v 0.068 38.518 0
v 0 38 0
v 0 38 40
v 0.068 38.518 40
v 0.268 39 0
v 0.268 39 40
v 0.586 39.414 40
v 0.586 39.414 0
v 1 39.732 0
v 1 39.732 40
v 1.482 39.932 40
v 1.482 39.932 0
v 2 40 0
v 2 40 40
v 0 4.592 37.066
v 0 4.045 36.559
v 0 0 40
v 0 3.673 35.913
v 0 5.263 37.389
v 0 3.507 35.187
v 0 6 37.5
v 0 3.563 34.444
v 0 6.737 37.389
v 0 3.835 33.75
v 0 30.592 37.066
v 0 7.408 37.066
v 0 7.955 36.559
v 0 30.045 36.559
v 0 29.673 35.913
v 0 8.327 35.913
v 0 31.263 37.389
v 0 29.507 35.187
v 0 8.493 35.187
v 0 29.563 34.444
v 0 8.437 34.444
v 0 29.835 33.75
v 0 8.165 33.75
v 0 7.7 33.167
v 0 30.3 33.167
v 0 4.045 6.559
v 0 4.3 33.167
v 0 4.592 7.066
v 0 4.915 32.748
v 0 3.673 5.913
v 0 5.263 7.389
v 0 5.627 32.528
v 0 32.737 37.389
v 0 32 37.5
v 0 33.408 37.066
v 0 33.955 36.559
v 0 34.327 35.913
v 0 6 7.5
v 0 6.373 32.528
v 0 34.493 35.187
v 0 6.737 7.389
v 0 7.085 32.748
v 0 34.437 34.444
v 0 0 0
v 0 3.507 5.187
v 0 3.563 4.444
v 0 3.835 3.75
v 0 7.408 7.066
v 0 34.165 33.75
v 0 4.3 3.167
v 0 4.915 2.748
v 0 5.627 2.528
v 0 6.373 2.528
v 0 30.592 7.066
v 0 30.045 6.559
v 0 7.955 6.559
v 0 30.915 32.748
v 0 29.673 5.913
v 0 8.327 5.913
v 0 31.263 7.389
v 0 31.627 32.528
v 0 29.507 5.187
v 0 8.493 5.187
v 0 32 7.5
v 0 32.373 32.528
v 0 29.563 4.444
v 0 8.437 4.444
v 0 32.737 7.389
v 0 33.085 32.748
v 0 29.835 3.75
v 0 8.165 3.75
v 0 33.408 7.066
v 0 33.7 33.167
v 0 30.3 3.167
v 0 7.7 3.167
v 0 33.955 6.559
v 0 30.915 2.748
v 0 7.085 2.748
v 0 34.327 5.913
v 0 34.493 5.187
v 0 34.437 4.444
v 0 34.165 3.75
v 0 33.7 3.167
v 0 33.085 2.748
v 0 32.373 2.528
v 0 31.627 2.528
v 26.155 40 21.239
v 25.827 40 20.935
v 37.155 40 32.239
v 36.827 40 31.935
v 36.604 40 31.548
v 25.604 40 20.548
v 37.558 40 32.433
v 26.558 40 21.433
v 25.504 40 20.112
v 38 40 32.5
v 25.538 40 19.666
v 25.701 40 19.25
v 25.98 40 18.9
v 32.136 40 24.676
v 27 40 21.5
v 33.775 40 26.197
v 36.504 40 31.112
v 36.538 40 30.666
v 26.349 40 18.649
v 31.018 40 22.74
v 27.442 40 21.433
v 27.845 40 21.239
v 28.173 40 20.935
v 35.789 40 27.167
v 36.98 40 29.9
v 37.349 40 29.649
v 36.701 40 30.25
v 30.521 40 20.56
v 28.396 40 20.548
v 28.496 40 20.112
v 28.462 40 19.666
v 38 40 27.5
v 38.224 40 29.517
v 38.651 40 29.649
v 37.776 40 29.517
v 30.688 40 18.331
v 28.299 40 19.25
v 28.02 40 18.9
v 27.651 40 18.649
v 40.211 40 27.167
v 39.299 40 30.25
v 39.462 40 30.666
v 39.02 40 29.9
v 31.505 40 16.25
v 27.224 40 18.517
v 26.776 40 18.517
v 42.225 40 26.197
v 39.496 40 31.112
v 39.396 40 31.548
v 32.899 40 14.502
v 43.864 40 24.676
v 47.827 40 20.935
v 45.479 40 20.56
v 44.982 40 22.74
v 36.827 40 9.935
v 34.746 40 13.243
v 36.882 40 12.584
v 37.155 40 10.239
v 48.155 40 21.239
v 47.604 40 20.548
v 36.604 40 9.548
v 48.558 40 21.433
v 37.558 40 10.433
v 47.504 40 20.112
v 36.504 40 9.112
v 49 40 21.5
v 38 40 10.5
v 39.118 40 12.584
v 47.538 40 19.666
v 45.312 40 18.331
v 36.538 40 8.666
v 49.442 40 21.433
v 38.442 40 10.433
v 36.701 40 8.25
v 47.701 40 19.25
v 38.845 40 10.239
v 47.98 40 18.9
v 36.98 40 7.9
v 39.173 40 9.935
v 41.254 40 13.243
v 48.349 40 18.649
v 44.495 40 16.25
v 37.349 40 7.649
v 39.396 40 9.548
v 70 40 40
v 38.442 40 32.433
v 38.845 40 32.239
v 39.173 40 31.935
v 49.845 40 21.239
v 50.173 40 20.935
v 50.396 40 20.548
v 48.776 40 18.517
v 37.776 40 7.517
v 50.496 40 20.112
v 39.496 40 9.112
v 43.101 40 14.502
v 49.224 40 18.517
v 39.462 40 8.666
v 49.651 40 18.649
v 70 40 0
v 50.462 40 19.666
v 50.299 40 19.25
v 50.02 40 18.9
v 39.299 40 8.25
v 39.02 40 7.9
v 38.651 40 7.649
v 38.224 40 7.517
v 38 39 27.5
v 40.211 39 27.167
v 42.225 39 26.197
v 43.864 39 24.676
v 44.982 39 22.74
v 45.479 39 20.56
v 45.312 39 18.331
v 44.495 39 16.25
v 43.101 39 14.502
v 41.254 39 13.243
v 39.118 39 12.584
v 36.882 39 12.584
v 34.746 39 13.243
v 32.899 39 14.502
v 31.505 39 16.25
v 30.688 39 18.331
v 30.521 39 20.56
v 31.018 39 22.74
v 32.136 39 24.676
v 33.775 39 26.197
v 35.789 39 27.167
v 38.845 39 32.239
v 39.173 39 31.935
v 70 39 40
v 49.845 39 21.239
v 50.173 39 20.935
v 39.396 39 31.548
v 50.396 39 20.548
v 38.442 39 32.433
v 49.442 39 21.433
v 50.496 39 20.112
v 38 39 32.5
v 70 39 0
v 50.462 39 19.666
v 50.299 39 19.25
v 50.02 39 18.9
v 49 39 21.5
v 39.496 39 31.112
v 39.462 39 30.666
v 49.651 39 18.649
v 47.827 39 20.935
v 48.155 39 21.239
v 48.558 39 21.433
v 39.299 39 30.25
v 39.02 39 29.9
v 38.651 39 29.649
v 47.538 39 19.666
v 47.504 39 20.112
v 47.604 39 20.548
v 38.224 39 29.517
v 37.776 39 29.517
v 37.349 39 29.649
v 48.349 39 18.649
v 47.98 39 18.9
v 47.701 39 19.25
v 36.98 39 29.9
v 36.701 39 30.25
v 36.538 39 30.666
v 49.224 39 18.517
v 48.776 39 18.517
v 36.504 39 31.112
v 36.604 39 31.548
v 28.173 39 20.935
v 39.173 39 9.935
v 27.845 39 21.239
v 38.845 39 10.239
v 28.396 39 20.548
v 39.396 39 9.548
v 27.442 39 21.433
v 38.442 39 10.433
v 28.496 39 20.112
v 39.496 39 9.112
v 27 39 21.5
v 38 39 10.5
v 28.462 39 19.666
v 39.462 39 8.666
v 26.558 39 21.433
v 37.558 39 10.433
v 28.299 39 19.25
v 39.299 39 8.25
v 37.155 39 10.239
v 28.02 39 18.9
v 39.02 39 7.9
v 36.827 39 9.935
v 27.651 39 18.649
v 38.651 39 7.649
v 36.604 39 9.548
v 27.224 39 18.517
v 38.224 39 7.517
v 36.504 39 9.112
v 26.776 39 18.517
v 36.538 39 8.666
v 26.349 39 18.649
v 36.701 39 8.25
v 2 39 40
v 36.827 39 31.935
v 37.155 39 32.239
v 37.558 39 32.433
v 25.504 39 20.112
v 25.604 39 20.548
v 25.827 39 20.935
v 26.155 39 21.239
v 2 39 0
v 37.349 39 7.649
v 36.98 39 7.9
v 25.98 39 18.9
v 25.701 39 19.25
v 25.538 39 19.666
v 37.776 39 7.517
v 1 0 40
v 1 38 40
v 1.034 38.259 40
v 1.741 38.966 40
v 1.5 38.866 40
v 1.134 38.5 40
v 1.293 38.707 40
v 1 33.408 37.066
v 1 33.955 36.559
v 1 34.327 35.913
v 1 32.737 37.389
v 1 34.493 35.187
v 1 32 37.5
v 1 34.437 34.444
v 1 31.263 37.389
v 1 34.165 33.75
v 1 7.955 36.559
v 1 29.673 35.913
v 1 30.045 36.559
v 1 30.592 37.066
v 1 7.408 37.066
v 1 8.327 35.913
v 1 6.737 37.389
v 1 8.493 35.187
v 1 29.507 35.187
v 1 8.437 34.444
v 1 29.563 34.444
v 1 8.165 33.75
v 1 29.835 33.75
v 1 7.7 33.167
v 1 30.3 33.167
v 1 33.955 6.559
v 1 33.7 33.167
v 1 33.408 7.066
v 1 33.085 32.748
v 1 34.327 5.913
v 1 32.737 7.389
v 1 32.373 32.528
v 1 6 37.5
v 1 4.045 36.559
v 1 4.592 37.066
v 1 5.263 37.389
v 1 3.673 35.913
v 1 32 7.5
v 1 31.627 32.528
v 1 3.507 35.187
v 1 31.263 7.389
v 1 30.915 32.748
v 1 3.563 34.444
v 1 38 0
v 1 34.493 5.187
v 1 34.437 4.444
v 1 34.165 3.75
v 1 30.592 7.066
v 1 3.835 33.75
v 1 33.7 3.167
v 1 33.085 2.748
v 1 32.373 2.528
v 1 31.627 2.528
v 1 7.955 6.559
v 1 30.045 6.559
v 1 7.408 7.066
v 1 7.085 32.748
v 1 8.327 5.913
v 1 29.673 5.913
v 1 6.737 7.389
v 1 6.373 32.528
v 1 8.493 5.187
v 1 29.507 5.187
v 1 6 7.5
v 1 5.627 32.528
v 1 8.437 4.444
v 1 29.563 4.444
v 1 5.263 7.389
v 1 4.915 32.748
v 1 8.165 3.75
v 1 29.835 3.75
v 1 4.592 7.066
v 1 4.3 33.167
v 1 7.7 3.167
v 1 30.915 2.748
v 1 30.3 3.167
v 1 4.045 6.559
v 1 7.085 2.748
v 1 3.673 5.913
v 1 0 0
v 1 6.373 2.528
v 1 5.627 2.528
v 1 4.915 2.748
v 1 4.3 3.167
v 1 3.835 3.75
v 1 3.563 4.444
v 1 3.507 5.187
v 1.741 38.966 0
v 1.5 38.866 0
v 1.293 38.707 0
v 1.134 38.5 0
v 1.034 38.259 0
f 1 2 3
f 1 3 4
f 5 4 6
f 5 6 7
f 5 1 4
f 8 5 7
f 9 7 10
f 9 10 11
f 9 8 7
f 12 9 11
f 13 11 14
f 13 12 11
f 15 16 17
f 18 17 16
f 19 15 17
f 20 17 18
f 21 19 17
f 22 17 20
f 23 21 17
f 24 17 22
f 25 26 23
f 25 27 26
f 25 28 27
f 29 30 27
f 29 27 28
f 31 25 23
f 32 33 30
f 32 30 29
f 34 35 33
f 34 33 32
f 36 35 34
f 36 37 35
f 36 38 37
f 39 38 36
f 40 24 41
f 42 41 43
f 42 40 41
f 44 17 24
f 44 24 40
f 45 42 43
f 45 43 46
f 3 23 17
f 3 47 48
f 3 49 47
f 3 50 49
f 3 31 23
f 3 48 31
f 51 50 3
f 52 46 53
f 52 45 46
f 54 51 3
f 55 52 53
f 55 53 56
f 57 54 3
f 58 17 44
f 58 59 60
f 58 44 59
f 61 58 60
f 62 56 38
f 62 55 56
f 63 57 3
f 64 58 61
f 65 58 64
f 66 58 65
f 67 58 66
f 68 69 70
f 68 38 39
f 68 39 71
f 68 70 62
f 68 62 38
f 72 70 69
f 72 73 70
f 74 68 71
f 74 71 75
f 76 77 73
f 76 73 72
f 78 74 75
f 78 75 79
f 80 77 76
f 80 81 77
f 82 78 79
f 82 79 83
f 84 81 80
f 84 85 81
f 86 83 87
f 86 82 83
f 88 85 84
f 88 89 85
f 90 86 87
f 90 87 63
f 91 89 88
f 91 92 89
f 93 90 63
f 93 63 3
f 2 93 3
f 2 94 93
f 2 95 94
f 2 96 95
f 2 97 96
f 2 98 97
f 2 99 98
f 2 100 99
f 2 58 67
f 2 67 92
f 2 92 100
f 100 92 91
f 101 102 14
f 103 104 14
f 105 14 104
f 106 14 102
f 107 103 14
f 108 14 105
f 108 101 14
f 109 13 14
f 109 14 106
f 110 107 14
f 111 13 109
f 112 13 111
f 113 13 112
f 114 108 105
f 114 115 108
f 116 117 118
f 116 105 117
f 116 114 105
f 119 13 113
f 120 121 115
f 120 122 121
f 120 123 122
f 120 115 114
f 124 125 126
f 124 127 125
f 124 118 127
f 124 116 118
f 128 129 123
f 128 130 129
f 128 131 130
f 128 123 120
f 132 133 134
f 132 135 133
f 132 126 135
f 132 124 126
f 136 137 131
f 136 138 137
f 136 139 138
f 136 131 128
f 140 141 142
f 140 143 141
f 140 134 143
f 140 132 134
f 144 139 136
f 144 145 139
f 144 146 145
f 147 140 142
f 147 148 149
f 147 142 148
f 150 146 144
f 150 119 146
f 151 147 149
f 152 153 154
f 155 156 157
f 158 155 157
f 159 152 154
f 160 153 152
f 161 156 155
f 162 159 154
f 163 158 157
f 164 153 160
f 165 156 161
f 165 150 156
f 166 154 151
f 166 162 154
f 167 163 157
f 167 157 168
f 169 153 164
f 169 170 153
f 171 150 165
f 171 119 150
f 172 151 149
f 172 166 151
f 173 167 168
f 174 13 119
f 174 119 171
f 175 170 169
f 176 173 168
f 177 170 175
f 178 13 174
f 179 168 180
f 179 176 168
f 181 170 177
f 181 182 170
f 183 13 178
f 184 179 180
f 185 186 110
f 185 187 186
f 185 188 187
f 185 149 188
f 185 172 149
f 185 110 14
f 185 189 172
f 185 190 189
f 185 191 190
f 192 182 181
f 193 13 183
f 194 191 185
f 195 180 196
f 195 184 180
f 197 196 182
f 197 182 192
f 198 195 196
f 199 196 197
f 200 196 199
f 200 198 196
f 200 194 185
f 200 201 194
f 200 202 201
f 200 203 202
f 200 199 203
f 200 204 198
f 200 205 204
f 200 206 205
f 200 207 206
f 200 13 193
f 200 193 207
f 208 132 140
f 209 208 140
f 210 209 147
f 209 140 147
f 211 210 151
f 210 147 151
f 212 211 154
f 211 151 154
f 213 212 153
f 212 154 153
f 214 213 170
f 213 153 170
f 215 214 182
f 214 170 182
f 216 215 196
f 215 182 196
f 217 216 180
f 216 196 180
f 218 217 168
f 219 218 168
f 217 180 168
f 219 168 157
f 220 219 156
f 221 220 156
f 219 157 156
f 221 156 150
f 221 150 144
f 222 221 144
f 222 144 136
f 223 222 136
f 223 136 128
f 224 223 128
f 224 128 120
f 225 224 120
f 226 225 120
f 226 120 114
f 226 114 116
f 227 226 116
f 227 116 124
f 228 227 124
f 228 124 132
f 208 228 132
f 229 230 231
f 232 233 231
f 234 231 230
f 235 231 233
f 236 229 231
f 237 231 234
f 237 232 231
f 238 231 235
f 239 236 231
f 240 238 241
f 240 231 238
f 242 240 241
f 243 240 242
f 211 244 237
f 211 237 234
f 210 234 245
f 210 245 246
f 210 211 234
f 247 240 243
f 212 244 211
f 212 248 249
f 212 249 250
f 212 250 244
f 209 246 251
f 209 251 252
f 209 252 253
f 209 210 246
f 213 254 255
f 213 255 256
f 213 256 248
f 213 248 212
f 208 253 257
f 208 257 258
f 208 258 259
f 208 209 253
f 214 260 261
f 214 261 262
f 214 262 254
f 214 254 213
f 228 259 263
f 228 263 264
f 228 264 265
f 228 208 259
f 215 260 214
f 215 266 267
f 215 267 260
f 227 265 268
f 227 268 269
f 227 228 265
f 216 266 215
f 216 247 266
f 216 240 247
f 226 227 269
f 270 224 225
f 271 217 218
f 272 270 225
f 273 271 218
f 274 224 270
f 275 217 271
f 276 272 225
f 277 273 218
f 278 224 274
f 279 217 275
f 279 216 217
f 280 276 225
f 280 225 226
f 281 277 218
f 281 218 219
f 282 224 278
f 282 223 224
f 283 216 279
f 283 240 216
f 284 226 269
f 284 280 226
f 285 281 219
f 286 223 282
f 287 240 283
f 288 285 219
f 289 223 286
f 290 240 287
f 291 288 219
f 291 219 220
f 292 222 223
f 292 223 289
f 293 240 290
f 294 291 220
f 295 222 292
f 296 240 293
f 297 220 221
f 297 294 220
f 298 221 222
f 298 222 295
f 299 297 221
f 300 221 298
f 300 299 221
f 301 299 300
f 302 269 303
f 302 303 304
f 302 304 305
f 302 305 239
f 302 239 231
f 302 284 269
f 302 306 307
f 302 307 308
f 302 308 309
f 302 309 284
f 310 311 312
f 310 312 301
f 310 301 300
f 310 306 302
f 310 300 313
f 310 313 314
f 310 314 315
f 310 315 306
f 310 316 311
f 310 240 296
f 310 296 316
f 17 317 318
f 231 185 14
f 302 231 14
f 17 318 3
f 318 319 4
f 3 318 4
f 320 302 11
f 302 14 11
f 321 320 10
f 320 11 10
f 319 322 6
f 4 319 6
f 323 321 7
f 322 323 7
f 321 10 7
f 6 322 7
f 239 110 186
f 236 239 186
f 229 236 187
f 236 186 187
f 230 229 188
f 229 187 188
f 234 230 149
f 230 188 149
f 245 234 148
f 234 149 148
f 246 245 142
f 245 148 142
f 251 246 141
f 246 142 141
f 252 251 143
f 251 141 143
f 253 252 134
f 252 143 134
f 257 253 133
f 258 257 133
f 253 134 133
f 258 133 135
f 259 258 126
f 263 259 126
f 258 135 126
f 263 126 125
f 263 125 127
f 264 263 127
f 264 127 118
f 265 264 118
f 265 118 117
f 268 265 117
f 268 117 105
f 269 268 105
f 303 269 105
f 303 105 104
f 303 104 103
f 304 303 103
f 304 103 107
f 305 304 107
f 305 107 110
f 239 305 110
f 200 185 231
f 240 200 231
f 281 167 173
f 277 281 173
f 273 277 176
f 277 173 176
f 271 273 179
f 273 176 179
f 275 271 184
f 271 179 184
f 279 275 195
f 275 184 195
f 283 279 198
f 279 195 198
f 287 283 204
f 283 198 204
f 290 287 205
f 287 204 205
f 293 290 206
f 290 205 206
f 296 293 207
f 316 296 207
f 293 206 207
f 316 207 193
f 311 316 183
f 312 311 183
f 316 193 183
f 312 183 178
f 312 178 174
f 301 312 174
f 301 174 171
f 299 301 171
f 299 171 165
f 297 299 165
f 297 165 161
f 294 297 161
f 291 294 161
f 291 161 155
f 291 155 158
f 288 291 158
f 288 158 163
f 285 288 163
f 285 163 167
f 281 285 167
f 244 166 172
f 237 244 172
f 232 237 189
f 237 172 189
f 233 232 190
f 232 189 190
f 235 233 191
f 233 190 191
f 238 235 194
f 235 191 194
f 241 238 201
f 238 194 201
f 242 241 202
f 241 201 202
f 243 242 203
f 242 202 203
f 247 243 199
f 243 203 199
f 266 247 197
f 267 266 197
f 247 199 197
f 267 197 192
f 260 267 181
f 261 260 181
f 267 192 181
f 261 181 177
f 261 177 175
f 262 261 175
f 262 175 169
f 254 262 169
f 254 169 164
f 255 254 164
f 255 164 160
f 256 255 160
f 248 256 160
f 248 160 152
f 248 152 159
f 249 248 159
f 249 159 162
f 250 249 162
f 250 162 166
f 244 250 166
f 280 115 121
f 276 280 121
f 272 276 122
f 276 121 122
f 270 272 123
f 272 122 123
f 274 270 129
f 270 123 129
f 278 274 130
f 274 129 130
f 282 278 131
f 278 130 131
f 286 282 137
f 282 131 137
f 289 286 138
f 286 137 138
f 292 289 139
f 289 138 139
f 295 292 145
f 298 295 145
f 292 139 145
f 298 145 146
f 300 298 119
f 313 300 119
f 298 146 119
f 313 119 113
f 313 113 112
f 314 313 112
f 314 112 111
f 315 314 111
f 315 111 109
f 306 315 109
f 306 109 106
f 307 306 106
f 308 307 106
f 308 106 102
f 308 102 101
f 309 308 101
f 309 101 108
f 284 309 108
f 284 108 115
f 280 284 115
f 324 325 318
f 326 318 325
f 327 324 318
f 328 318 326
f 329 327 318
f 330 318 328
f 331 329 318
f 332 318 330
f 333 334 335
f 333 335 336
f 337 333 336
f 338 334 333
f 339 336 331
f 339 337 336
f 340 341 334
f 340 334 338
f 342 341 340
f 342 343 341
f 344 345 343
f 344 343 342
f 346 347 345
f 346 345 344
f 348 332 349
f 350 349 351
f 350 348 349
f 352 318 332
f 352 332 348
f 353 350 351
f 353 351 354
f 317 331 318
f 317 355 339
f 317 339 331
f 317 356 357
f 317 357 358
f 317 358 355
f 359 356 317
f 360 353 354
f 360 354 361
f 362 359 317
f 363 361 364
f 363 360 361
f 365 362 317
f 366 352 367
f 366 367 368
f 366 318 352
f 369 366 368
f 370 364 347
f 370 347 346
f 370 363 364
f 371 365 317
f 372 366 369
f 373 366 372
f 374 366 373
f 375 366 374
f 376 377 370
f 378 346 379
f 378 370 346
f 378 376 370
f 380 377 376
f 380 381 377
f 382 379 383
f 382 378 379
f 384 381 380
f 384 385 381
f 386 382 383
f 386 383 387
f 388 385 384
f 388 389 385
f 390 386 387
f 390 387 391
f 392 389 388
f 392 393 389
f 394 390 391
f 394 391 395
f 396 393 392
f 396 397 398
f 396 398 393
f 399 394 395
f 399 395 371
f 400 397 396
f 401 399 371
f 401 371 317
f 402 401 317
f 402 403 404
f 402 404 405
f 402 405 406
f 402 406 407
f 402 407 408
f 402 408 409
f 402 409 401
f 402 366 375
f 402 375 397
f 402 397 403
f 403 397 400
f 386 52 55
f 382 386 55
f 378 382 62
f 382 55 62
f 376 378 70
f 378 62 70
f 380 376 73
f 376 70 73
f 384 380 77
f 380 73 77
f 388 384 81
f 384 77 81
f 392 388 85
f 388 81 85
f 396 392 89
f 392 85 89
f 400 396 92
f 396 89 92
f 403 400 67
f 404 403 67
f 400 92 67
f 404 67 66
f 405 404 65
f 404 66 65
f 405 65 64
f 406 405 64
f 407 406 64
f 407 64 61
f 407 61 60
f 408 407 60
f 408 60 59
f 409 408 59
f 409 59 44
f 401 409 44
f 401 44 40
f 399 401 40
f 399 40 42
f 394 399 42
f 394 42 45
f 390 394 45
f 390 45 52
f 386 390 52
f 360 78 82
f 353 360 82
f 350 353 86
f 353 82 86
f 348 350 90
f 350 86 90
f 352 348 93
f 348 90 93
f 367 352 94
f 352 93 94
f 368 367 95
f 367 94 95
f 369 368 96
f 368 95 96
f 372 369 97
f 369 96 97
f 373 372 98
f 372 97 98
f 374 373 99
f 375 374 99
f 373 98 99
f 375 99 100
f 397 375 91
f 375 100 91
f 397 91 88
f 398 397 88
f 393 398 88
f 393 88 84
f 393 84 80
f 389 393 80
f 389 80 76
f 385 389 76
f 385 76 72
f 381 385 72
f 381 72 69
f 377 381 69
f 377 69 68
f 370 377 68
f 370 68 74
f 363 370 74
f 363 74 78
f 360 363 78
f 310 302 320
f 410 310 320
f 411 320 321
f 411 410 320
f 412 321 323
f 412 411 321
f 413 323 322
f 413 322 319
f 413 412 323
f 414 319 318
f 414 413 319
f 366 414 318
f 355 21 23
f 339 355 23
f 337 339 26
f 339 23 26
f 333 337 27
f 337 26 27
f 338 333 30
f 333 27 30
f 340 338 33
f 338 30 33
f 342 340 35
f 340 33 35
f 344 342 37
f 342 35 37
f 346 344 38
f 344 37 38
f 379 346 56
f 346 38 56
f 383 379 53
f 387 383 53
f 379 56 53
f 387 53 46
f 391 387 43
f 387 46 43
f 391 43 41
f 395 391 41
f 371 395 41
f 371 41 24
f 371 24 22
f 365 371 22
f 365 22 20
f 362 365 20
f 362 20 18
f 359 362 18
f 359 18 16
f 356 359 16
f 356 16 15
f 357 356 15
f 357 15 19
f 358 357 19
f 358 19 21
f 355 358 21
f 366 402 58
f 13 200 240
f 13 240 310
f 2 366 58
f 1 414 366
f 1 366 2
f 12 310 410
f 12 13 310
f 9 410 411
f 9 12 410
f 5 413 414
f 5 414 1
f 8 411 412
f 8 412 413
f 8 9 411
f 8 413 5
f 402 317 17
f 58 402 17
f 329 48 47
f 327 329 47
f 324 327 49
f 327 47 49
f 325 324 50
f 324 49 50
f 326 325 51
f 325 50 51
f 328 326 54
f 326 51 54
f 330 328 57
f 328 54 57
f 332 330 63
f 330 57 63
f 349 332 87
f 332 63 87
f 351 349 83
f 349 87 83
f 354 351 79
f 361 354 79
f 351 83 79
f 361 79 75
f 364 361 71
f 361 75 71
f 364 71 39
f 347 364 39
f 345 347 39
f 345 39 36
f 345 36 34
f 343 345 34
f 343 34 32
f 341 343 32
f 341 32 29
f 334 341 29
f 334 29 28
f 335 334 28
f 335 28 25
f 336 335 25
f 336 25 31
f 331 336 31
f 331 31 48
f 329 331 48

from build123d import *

# Parameters (mm, degrees)
BASE_FLANGE1_DEPTH = 40
CUT_EXTRUDE1_REACH = 92
SKETCH6_R          = 7.5
SKETCH7_R          = 1.5
CUT_EXTRUDE2_DEPTH = 91
CUT_EXTRUDE3_REACH = 92
SKETCH8_R          = 2.5


# Sheet-metal steps are written as plain solids
with BuildPart() as part:
    # Sketch1 → Base-Flange1 (new body)
    with BuildSketch(Plane.XY):
        with BuildLine():
            Line((0, 0), (0, 38))
            ThreePointArc((0, 38), (0.585786438, 39.414213562), (2, 40))
            Line((2, 40), (70, 40))
            Line((70, 40), (70, 39))
            Line((70, 39), (2, 39))
            ThreePointArc((2, 39), (1.292893219, 38.707106781), (1, 38))
            Line((1, 38), (1, 0))
            Line((1, 0), (0, 0))
        make_face()
    extrude(amount=BASE_FLANGE1_DEPTH)

    # Sketch6 → Cut-Extrude1 (cut, up to next)
    with BuildSketch(Plane(origin=(0, 40, 0), x_dir=(1, 0, 0), z_dir=(0, 1, 0)), mode=Mode.PRIVATE) as cut_extrude1_sk1:
        with Locations(Location((38, -20, 0), (0, 0, 270))):
            Circle(SKETCH6_R)
    cut_extrude1_tool1 = extrude(cut_extrude1_sk1.sketch, amount=-CUT_EXTRUDE1_REACH, mode=Mode.PRIVATE) & part.part
    add(cut_extrude1_tool1.solids().sort_by_distance((38, 40, 20))[0], mode=Mode.SUBTRACT)

    # Sketch7 → Cut-Extrude2 (cut, through all)
    with BuildSketch(Plane(origin=(0, 40, 0), x_dir=(1, 0, 0), z_dir=(0, 1, 0))):
        with Locations(Location((49, -20, 0), (0, 0, 270))):
            Circle(SKETCH7_R)
        with Locations(Location((38, -31, 0), (0, 0, 270))):
            Circle(SKETCH7_R)
        with Locations(Location((27, -20, 0), (0, 0, 270))):
            Circle(SKETCH7_R)
        with Locations(Location((38, -9, 0), (0, 0, 270))):
            Circle(SKETCH7_R)
    extrude(amount=-CUT_EXTRUDE2_DEPTH, mode=Mode.SUBTRACT)

    # Sketch8 → Cut-Extrude3 (cut, up to next)
    with BuildSketch(Plane.ZY, mode=Mode.PRIVATE) as cut_extrude3_sk1:
        with Locations((5, 32)):
            Circle(SKETCH8_R)
    cut_extrude3_tool1 = extrude(cut_extrude3_sk1.sketch, amount=-CUT_EXTRUDE3_REACH, mode=Mode.PRIVATE) & part.part
    # Sketch8 → Cut-Extrude3 (cut, up to next)
    with BuildSketch(Plane.ZY, mode=Mode.PRIVATE) as cut_extrude3_sk2:
        with Locations((5, 6)):
            Circle(SKETCH8_R)
    cut_extrude3_tool2 = extrude(cut_extrude3_sk2.sketch, amount=-CUT_EXTRUDE3_REACH, mode=Mode.PRIVATE) & part.part
    # Sketch8 → Cut-Extrude3 (cut, up to next)
    with BuildSketch(Plane.ZY, mode=Mode.PRIVATE) as cut_extrude3_sk3:
        with Locations((35, 6)):
            Circle(SKETCH8_R)
    cut_extrude3_tool3 = extrude(cut_extrude3_sk3.sketch, amount=-CUT_EXTRUDE3_REACH, mode=Mode.PRIVATE) & part.part
    # Sketch8 → Cut-Extrude3 (cut, up to next)
    with BuildSketch(Plane.ZY, mode=Mode.PRIVATE) as cut_extrude3_sk4:
        with Locations((35, 32)):
            Circle(SKETCH8_R)
    cut_extrude3_tool4 = extrude(cut_extrude3_sk4.sketch, amount=-CUT_EXTRUDE3_REACH, mode=Mode.PRIVATE) & part.part
    add(cut_extrude3_tool1.solids().sort_by_distance((0, 32, 5))[0], mode=Mode.SUBTRACT)
    add(cut_extrude3_tool2.solids().sort_by_distance((0, 6, 5))[0], mode=Mode.SUBTRACT)
    add(cut_extrude3_tool3.solids().sort_by_distance((0, 6, 35))[0], mode=Mode.SUBTRACT)
    add(cut_extrude3_tool4.solids().sort_by_distance((0, 32, 35))[0], mode=Mode.SUBTRACT)


solid = part.part
